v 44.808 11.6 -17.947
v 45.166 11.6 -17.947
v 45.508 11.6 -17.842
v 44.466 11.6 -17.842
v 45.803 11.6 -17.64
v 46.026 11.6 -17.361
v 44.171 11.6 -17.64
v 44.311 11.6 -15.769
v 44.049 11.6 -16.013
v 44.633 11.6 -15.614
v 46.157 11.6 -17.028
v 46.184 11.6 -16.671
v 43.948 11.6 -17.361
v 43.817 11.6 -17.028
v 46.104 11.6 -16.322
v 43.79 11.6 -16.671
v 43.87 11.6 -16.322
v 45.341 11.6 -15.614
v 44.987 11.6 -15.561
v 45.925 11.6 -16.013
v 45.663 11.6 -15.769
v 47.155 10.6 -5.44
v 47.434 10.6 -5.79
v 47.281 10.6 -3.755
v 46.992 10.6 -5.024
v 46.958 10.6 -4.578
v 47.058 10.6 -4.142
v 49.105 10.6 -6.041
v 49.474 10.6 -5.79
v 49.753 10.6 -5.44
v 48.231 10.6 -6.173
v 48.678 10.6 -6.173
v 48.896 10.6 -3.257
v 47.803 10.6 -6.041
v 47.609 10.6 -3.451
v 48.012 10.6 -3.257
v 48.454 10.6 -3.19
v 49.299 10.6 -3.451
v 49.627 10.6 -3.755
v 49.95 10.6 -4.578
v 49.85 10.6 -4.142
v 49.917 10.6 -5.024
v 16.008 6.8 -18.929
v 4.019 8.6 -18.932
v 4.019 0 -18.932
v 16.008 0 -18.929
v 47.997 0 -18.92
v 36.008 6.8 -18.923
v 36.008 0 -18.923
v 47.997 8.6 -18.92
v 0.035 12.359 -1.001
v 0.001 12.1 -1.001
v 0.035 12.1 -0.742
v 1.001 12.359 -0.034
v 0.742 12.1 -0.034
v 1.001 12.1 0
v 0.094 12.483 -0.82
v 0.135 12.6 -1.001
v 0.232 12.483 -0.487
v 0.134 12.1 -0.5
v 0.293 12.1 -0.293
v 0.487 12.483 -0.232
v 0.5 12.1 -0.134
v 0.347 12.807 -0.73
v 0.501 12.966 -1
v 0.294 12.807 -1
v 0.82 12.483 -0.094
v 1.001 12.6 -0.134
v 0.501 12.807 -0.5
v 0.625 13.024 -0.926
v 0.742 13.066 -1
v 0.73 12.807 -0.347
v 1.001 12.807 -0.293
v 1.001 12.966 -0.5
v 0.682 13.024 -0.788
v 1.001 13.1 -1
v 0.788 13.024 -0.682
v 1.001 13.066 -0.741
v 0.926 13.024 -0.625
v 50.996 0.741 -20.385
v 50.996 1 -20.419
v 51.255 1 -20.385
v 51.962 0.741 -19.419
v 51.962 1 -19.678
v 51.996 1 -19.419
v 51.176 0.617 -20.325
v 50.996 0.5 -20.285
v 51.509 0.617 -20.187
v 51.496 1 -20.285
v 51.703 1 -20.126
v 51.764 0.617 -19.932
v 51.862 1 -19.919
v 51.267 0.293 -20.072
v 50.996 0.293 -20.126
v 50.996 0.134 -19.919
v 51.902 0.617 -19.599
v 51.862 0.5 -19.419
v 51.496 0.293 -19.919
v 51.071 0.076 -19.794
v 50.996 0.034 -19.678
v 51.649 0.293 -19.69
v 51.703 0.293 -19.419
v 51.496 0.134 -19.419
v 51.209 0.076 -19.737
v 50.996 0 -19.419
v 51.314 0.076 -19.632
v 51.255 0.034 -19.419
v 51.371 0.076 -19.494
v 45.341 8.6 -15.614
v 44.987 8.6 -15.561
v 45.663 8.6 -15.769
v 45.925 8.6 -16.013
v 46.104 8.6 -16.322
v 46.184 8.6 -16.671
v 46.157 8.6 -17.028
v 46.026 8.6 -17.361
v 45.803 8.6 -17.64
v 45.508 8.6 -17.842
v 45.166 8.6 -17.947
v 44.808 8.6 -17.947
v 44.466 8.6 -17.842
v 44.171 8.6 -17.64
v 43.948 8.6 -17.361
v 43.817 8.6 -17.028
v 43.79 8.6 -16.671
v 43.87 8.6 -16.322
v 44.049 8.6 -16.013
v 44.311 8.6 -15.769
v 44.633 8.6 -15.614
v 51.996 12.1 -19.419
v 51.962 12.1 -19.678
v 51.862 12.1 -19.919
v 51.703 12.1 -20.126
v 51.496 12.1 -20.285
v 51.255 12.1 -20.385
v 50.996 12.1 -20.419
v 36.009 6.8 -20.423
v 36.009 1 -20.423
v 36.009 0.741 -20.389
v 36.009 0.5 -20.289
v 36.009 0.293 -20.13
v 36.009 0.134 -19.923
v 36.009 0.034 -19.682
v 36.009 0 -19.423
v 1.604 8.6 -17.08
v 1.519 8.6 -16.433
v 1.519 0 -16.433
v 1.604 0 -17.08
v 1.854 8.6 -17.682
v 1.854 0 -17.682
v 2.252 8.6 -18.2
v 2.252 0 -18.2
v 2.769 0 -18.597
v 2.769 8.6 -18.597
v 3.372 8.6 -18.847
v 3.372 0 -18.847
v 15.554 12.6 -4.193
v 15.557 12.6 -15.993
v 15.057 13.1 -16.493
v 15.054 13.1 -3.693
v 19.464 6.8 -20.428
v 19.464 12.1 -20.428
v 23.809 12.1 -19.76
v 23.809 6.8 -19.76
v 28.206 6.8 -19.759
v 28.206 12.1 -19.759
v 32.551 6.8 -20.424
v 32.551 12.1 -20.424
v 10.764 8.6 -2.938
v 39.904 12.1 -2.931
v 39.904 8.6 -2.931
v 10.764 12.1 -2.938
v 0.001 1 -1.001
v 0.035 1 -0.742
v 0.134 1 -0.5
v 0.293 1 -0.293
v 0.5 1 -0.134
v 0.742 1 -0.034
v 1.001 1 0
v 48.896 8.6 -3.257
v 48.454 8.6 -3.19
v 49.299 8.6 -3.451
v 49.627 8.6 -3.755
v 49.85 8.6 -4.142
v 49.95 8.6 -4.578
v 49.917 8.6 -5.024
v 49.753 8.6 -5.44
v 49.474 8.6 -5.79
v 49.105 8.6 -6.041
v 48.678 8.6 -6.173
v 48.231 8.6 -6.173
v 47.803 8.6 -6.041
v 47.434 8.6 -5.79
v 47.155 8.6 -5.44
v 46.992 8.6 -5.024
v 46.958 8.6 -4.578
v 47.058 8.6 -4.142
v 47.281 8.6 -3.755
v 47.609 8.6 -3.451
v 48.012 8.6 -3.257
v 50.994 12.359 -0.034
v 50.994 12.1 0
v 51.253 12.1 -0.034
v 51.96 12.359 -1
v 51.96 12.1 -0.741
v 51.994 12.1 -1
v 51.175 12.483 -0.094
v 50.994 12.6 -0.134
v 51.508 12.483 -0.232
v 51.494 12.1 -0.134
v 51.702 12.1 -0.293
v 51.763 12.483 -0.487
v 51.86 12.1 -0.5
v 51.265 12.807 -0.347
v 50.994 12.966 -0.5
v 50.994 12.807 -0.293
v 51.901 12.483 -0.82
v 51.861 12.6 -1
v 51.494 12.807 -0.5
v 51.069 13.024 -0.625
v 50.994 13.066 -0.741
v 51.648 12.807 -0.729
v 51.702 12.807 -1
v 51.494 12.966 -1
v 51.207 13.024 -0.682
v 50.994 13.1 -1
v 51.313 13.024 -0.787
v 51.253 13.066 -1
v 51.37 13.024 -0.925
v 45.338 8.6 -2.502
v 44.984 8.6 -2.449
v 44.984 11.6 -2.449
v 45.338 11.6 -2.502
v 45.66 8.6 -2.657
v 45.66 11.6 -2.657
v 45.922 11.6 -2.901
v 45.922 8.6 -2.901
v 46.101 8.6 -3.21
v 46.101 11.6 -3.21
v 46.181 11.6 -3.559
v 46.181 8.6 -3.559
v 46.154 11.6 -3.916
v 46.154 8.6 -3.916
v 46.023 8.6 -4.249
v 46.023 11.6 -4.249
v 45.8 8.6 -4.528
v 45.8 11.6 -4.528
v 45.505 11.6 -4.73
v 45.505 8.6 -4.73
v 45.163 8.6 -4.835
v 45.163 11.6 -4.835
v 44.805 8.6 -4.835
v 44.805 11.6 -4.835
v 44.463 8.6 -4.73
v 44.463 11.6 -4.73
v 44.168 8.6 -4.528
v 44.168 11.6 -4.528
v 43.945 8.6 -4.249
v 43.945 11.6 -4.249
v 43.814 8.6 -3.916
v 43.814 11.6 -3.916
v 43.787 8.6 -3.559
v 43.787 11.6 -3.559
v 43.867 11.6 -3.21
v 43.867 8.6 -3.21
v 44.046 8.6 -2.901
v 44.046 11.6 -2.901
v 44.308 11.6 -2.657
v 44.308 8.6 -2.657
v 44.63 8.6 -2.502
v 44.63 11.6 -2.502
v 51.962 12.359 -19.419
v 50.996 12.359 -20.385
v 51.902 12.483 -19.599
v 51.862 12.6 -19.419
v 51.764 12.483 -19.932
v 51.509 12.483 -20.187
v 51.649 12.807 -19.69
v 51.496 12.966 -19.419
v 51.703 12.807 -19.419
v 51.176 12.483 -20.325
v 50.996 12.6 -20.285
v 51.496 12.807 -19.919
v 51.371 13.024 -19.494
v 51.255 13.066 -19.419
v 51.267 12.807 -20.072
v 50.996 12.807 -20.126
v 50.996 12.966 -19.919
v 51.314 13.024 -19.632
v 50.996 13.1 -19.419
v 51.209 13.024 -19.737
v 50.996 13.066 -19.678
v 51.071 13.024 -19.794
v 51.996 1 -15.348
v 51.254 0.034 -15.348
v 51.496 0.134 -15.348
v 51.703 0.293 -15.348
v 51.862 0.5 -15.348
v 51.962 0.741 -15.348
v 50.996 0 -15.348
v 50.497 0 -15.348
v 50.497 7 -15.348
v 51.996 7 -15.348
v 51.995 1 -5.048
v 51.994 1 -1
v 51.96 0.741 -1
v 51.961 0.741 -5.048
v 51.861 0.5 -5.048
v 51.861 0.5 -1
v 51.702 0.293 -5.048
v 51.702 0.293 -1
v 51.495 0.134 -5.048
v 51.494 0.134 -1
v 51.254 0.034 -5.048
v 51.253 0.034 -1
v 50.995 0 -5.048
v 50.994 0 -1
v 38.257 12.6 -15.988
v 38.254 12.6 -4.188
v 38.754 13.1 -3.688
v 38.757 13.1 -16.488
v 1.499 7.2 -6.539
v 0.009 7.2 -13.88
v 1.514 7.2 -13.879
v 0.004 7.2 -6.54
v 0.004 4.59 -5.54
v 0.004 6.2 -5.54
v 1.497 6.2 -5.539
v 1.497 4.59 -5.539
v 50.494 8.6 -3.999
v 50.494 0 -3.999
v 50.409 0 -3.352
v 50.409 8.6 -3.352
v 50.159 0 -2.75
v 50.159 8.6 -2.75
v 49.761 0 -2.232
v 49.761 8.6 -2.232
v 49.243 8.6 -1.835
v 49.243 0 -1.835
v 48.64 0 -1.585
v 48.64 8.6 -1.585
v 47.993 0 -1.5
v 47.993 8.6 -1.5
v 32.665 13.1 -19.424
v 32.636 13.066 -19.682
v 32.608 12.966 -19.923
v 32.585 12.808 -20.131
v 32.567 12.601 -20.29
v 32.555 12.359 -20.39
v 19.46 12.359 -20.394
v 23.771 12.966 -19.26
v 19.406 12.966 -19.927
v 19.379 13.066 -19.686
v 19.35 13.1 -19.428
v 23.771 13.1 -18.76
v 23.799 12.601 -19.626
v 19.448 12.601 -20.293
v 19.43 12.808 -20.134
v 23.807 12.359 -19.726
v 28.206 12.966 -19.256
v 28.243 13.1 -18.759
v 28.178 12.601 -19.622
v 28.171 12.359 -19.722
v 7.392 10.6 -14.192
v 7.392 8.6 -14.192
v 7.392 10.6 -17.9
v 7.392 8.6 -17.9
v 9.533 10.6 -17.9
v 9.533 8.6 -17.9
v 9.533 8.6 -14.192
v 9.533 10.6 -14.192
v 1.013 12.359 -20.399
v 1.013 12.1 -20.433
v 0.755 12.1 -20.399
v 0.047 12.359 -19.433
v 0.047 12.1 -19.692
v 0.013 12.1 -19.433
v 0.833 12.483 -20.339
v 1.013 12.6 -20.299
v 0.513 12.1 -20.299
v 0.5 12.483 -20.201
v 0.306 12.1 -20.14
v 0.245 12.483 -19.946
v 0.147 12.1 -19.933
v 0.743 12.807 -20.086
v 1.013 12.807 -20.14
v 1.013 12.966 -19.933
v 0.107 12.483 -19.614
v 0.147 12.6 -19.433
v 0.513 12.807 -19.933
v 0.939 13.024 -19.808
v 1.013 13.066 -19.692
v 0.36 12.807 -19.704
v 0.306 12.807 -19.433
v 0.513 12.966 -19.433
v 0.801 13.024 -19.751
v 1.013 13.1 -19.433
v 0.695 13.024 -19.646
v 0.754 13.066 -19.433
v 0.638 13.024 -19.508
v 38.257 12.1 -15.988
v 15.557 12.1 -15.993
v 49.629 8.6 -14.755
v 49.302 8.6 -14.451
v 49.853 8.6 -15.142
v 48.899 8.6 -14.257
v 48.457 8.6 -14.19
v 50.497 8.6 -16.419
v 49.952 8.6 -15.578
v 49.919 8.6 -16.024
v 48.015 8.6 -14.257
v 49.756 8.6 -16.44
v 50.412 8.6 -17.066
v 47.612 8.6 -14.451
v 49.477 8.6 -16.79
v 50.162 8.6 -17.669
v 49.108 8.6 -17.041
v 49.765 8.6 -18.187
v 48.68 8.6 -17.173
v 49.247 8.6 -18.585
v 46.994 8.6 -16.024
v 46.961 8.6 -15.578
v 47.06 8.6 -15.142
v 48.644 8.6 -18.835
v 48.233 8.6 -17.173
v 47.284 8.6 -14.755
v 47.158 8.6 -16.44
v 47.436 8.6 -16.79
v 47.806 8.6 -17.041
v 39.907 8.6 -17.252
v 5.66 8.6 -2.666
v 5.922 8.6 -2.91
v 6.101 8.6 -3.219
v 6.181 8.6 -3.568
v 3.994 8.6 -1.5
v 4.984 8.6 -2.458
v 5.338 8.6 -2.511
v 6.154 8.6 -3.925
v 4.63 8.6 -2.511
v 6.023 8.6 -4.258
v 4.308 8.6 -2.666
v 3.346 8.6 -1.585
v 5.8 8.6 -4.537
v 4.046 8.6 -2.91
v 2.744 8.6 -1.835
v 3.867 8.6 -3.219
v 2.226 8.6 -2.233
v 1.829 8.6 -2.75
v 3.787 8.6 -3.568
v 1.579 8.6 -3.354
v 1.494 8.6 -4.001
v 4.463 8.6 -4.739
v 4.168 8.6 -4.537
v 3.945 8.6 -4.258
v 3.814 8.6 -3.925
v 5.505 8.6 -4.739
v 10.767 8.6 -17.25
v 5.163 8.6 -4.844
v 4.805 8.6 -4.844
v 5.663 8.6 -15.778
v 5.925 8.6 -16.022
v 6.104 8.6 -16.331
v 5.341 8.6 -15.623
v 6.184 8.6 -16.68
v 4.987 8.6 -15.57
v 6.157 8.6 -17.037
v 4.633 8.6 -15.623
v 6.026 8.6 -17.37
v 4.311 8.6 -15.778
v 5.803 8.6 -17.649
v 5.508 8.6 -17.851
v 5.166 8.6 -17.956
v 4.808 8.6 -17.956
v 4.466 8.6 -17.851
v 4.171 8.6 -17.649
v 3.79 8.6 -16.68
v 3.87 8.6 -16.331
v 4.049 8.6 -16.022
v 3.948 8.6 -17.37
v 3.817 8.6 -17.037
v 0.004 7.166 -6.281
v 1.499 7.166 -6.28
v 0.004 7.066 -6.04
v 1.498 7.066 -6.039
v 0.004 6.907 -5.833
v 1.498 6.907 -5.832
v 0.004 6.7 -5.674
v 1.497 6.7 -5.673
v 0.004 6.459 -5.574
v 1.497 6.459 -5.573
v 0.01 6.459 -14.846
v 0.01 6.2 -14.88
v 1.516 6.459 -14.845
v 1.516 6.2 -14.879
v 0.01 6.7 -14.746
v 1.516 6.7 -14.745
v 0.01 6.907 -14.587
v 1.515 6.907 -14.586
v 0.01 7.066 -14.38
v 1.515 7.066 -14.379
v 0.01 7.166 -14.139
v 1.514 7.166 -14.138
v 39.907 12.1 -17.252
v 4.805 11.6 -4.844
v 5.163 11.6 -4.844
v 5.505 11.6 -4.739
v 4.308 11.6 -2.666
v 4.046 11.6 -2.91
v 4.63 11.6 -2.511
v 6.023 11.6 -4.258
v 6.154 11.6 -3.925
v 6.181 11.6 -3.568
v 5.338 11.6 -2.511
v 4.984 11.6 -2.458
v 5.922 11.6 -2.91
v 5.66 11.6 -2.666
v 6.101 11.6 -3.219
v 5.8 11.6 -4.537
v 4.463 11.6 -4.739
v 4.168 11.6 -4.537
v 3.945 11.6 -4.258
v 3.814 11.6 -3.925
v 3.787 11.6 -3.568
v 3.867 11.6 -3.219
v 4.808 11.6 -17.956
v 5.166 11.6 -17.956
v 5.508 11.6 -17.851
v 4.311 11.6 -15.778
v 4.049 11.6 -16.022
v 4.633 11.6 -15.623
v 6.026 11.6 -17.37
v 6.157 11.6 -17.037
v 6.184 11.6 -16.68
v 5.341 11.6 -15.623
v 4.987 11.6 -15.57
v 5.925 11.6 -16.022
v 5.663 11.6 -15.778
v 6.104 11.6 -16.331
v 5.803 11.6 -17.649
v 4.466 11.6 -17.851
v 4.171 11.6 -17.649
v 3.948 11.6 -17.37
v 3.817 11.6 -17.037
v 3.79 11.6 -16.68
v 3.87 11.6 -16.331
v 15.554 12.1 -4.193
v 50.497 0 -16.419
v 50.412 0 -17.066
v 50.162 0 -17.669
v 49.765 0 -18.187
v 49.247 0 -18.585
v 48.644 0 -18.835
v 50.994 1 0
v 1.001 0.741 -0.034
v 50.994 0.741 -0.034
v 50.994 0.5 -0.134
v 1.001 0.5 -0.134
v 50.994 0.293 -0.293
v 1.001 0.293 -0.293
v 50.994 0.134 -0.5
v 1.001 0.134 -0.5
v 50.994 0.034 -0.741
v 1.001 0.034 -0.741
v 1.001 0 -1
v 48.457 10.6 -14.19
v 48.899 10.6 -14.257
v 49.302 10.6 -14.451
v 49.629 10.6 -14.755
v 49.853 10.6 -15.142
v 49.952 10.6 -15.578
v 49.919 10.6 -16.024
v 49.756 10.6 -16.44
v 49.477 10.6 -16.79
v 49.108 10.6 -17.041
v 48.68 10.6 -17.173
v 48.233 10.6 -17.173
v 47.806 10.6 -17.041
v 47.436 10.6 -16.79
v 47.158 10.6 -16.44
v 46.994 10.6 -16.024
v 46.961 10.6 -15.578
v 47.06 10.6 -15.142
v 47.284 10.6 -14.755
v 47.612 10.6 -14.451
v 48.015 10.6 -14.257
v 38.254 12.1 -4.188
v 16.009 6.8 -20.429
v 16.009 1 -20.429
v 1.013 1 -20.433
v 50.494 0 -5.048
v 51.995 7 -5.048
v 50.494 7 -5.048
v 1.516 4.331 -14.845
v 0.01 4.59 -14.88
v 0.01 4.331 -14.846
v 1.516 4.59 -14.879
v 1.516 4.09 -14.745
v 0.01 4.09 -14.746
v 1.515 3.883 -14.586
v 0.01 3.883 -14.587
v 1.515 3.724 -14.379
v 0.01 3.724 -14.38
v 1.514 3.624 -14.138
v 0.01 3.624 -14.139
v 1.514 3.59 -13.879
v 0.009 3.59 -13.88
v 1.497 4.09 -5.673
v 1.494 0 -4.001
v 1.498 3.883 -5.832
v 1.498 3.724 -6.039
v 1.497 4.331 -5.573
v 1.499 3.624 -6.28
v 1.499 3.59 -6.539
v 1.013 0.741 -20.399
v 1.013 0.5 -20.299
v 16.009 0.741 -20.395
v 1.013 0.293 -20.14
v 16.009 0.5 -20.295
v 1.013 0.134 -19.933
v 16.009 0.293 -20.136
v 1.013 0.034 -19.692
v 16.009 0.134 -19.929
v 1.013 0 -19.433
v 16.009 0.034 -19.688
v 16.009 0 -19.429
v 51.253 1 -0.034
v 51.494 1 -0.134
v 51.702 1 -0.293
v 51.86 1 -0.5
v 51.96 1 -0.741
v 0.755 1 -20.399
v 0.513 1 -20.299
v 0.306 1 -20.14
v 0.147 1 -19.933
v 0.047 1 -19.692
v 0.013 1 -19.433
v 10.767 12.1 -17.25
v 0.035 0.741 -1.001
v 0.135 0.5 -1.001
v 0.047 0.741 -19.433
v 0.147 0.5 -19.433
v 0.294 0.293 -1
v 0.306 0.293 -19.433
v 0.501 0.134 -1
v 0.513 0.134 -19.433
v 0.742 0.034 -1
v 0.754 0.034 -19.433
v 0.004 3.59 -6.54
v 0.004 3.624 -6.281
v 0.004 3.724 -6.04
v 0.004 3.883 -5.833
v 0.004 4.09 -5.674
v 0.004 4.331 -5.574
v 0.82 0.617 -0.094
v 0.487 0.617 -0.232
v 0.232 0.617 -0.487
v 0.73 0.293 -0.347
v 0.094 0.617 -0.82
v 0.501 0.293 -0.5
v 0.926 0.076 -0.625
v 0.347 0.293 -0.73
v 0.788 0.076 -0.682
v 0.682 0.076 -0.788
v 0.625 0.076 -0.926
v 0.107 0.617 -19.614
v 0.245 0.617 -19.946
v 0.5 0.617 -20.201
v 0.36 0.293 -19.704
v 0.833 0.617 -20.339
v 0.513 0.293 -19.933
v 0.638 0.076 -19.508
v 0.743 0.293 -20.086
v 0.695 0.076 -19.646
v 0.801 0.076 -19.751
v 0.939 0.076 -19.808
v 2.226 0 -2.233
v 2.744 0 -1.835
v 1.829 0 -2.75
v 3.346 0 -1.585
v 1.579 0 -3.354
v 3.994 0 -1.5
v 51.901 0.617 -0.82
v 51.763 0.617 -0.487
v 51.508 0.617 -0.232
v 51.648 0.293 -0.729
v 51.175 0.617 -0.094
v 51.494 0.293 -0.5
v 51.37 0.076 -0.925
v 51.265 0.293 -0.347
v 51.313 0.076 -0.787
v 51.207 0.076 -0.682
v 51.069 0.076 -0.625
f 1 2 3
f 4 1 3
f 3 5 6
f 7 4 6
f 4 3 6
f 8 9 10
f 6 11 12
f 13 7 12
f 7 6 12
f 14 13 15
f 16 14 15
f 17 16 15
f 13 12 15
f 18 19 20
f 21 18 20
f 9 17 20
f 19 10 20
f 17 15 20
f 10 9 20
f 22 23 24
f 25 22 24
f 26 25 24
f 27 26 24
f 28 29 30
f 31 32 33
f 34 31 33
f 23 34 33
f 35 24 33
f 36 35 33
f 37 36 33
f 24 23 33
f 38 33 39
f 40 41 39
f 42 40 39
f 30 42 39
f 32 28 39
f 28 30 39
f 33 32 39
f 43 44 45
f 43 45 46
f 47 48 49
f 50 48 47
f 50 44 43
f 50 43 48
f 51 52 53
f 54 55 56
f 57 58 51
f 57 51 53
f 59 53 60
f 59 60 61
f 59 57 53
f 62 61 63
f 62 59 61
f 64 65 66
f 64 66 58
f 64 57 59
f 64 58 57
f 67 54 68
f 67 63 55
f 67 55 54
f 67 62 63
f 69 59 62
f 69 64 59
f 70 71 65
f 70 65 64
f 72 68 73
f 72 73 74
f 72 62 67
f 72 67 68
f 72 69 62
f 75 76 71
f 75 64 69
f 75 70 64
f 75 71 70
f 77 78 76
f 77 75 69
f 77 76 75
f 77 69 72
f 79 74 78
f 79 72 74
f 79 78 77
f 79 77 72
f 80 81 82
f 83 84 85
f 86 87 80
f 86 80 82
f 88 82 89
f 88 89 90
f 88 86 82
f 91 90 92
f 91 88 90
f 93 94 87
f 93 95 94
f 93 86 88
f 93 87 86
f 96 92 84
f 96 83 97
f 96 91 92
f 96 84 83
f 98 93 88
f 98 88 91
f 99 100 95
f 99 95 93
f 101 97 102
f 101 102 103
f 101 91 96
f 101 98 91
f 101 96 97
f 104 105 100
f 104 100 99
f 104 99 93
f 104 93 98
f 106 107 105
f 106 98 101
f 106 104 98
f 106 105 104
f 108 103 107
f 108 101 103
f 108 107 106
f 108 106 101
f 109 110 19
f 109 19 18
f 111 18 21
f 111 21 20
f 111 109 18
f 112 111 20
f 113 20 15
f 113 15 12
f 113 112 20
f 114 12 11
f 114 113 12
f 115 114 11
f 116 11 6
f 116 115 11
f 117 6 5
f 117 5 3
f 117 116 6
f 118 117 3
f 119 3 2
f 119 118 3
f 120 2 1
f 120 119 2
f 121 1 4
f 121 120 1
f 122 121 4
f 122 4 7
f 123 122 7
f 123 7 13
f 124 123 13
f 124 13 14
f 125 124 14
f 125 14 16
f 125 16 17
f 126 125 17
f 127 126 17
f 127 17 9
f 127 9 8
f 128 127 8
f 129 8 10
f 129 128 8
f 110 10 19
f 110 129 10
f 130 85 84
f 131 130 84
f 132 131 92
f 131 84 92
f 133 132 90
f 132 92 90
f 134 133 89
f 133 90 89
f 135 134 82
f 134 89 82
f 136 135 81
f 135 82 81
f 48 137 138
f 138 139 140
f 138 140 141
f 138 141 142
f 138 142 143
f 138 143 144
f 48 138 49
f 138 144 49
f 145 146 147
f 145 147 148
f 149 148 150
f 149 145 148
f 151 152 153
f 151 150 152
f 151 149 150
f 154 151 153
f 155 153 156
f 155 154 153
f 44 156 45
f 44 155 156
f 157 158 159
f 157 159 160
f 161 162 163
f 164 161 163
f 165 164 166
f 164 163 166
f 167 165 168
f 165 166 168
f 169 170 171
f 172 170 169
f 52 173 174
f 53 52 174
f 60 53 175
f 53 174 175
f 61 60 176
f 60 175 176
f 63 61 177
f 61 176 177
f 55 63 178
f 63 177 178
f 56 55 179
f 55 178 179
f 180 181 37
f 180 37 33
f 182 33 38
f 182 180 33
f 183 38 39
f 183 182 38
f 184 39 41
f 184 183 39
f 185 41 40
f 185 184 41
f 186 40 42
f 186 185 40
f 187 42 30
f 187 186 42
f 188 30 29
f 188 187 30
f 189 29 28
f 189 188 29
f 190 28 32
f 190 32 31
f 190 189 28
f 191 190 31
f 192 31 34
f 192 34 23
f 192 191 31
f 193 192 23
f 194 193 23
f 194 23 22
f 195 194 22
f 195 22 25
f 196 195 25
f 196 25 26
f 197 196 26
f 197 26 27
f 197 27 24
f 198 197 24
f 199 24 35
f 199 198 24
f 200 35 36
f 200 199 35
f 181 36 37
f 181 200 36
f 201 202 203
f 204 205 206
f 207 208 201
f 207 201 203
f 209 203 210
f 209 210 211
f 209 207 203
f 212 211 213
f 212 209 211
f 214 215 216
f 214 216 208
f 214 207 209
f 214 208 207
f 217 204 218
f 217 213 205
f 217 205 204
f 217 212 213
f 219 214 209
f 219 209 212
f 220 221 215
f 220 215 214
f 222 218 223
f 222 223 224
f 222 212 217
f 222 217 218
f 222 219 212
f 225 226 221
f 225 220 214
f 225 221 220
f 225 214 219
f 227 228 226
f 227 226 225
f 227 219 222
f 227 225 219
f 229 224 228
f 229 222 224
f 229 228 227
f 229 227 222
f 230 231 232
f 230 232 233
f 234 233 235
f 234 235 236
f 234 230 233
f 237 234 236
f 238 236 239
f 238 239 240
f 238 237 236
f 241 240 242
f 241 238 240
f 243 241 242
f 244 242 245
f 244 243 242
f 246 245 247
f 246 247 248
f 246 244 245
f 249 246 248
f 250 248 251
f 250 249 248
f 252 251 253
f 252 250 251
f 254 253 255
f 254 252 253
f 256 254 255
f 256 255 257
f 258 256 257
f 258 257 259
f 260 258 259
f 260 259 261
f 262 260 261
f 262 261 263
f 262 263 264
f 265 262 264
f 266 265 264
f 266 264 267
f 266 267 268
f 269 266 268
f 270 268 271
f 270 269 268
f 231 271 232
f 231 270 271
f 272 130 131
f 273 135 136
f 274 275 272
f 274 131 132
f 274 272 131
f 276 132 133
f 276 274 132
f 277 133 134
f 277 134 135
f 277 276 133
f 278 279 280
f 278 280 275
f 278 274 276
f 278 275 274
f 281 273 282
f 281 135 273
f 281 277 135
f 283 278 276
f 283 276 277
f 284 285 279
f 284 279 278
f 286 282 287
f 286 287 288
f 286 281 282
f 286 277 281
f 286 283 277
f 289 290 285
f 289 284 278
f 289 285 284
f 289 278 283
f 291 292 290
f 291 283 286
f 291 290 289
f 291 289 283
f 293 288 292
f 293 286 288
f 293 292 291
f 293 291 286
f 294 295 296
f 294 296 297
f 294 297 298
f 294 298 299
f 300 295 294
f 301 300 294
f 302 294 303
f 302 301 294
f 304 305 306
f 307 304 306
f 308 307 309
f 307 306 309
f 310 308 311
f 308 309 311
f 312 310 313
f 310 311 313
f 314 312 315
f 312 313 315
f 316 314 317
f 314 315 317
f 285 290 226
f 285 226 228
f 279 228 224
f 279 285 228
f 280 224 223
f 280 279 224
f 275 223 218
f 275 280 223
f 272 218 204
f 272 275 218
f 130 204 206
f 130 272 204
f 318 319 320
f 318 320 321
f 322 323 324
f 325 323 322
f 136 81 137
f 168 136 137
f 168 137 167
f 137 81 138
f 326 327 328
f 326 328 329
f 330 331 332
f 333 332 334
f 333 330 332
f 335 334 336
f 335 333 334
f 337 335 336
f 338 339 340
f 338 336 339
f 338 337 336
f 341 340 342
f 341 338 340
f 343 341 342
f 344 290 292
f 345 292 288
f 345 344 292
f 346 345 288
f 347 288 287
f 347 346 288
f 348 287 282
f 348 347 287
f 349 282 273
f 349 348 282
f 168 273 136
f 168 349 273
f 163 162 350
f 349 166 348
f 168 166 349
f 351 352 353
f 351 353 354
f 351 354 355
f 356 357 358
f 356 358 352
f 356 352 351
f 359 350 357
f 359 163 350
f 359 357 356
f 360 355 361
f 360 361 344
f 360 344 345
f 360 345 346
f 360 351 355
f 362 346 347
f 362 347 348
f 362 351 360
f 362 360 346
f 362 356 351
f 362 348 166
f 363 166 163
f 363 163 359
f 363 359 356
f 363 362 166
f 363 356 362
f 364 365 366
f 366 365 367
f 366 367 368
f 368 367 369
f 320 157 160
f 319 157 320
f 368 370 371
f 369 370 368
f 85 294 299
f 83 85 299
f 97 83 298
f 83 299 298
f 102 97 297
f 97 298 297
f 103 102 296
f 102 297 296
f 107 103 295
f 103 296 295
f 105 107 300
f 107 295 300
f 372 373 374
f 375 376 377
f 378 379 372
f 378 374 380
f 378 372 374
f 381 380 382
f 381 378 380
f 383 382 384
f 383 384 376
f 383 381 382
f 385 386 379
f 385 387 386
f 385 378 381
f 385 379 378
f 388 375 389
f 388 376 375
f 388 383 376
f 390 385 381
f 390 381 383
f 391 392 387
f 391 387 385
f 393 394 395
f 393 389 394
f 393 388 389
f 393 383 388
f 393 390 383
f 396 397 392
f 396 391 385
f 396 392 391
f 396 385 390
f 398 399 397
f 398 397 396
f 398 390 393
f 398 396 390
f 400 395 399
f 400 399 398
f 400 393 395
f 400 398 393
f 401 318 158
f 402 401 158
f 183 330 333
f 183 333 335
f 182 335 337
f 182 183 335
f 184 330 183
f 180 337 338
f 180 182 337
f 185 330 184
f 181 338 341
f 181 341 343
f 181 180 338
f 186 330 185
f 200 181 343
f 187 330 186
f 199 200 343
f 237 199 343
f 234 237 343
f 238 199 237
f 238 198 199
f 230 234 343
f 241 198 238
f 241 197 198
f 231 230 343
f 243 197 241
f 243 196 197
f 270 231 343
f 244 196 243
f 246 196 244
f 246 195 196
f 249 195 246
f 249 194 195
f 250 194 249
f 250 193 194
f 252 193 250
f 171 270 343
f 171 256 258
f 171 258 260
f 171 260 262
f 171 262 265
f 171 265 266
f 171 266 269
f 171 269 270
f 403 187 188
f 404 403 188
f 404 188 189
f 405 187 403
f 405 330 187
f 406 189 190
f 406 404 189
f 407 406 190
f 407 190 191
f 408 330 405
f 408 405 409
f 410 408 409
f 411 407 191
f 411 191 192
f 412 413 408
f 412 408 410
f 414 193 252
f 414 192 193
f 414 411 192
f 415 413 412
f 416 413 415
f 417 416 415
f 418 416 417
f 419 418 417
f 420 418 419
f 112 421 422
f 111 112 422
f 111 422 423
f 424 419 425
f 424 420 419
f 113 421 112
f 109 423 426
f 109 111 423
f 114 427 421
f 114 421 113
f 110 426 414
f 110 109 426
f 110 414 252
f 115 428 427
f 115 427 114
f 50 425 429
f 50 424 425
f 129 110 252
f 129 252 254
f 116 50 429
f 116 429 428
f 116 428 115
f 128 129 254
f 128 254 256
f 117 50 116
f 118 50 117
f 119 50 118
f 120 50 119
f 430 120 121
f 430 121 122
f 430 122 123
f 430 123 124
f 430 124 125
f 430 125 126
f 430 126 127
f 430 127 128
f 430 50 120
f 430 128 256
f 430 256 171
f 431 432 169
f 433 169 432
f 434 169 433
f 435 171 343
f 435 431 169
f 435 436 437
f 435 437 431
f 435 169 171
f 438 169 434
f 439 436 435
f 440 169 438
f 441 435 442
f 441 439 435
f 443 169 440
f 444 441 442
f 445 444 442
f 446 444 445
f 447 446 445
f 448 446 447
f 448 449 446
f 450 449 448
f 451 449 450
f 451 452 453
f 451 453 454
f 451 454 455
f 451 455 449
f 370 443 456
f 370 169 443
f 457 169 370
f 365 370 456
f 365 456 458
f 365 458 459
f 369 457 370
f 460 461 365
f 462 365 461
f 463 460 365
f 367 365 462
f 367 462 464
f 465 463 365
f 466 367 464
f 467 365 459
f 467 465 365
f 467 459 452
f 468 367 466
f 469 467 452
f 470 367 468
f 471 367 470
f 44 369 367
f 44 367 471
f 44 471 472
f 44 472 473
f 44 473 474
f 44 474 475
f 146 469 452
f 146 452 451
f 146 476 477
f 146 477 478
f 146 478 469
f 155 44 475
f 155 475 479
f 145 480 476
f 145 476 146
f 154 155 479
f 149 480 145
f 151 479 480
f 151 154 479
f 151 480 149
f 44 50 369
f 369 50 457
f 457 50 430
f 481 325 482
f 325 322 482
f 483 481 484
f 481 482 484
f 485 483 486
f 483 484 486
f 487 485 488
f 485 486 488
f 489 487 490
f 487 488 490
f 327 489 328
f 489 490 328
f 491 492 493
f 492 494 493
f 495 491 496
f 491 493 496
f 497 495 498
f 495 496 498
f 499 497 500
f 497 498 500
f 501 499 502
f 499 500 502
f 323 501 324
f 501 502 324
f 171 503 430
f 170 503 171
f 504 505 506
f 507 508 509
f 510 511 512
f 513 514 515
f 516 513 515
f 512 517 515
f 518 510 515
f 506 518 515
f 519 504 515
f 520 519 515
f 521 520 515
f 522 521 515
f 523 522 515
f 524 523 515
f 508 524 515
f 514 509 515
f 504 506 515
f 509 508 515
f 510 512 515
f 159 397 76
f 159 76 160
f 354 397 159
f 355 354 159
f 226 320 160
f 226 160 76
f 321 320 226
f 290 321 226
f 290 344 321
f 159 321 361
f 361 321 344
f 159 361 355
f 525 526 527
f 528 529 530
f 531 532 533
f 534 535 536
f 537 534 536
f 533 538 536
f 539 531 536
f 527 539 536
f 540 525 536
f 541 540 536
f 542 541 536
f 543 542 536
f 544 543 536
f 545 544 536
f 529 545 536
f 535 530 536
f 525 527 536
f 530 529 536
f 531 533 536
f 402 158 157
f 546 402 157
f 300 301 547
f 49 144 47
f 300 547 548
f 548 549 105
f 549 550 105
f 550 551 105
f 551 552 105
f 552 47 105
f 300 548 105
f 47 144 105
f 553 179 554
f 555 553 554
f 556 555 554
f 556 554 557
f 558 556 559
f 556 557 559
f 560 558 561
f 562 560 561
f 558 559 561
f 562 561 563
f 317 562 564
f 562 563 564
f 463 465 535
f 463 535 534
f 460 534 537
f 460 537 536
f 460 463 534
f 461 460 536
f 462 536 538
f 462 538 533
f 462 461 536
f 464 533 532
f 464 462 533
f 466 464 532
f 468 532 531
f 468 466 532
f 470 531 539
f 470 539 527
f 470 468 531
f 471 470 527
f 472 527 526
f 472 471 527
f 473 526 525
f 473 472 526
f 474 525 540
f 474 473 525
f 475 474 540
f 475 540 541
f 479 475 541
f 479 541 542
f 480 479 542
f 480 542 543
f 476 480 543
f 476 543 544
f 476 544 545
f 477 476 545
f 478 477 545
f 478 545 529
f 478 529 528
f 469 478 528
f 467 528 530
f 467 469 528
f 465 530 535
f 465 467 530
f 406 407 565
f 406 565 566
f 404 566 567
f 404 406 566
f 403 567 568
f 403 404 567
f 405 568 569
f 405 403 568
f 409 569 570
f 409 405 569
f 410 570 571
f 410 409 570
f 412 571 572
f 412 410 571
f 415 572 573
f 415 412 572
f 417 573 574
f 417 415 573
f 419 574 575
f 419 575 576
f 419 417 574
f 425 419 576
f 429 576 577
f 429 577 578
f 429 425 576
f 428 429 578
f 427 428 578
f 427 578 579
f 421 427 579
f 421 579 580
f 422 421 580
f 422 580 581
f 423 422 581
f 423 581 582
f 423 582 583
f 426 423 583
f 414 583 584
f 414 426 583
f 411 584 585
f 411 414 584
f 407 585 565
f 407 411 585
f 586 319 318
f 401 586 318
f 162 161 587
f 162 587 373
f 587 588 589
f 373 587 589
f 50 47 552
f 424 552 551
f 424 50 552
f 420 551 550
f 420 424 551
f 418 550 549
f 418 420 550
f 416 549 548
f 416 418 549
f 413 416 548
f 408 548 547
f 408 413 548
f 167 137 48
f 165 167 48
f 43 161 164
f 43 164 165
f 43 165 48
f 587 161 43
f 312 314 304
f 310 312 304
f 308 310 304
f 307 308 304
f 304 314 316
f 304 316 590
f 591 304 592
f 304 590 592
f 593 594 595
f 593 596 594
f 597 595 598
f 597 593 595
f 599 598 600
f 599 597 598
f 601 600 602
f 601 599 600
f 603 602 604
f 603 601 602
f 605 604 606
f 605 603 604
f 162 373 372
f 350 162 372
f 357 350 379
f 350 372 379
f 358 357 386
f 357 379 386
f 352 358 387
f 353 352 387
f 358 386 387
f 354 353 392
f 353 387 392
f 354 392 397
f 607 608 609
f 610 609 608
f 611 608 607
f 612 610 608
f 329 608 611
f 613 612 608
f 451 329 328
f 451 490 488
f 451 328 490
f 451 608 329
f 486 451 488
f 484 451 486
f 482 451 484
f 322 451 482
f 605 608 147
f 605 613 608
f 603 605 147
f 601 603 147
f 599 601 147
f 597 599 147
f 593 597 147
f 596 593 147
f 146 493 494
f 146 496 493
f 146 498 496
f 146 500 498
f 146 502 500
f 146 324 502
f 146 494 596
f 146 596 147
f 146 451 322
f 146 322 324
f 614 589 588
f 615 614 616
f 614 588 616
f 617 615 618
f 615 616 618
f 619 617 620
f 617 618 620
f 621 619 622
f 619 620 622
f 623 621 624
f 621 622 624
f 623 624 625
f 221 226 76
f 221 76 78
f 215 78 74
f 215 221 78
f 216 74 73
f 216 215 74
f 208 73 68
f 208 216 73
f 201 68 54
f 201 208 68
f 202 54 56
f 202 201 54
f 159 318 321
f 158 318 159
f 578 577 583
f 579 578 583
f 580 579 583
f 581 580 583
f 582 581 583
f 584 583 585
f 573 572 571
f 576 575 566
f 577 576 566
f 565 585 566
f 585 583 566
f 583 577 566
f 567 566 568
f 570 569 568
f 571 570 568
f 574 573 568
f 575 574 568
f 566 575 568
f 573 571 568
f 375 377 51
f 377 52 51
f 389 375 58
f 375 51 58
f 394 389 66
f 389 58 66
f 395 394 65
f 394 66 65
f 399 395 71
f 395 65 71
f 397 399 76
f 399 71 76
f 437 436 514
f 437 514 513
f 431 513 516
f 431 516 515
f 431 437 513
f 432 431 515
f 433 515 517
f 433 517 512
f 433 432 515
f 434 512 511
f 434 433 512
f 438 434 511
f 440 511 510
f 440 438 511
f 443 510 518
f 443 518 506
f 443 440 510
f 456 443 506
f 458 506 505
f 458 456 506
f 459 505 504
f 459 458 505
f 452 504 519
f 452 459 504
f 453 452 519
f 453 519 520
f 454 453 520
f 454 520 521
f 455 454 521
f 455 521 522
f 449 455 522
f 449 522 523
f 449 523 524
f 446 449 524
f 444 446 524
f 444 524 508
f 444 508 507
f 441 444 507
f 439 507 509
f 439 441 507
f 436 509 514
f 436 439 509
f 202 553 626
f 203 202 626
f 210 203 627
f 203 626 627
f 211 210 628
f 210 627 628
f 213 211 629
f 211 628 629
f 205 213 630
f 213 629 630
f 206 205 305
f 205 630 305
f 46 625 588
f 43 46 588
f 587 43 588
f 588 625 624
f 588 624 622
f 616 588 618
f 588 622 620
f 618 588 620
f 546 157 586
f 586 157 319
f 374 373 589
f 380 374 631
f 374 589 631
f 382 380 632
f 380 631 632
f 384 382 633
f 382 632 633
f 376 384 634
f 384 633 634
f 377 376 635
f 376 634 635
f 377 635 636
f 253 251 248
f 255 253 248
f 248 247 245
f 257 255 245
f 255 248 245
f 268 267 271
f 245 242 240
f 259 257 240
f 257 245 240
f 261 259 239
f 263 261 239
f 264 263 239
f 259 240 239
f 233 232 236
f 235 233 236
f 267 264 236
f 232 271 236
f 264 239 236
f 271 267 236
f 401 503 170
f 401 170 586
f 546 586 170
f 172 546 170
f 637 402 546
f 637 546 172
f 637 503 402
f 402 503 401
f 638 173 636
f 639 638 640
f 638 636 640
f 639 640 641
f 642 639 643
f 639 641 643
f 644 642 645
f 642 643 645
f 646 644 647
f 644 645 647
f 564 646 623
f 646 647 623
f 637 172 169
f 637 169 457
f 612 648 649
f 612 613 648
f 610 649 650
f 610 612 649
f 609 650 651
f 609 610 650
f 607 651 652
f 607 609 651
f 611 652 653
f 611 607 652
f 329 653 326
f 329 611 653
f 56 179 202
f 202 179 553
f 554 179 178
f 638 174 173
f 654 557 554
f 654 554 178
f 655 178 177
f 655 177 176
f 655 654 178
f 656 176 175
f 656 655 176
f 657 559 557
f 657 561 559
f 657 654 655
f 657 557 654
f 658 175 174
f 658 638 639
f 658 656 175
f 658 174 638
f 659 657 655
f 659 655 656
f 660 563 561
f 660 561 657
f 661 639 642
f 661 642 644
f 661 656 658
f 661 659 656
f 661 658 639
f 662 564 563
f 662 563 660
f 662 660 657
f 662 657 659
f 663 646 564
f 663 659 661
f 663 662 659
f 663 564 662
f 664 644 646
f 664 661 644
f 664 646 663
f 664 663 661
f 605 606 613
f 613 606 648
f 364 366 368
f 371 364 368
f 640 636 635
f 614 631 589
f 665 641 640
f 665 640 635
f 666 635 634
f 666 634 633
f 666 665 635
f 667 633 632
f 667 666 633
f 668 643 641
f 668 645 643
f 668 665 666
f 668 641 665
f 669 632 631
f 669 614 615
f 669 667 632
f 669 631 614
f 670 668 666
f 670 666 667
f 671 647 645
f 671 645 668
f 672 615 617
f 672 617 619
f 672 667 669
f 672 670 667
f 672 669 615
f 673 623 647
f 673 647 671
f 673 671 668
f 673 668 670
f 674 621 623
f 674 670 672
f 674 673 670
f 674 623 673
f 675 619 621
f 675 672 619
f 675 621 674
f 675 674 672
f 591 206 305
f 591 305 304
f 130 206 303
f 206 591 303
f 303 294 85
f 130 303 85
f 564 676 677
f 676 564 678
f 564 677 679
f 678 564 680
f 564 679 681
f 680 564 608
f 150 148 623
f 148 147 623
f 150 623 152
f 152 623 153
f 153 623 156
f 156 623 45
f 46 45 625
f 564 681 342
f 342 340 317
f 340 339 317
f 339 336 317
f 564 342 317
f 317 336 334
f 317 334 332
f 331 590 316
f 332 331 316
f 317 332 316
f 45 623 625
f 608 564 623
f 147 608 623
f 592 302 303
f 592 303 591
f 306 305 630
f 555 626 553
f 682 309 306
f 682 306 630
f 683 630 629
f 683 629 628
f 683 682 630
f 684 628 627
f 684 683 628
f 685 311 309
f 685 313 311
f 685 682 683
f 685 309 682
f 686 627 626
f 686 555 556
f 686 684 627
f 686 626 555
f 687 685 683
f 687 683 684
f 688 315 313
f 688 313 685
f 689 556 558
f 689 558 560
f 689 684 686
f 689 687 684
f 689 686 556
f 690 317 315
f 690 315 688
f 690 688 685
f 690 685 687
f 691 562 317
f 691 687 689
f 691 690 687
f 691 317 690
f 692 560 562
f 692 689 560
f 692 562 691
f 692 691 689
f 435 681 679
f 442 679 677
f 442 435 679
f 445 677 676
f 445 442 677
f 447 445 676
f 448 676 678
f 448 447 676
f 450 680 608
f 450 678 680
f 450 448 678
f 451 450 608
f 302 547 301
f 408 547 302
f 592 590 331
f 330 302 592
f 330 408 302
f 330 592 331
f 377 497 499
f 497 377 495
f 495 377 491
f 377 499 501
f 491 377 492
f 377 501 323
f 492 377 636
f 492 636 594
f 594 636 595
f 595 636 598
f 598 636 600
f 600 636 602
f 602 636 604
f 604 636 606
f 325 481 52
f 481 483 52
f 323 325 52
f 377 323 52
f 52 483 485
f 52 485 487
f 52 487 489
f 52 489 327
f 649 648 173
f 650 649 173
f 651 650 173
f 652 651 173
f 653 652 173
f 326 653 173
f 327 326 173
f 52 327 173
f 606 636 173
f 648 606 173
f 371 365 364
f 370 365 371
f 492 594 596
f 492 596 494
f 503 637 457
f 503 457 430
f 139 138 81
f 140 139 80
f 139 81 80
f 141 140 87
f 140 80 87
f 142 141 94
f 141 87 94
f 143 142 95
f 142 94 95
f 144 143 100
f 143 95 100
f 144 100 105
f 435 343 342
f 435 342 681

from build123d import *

# Parameters (mm, degrees)
EXTRUDE_1_DEPTH      = 13.1
CUT_EXTRUDE_1_DEPTH  = 1
CUT_EXTRUDE_2_DEPTH  = 3.5
CUT_EXTRUDE_3_DEPTH  = 11.5
SKETCH_7_R           = 1.2
CUT_EXTRUDE_4_DEPTH  = 3
CUT_EXTRUDE_5_DEPTH  = 3
SKETCH_17_W          = 10.3
SKETCH_17_H          = 7
CUT_EXTRUDE_7_DEPTH  = 3
SKETCH_23_R          = 28.905330341
CUT_EXTRUDE_16_DEPTH = 15
FILLET_1_R           = 1
FILLET_2_R           = 1
CHAMFER_1_SIZE       = 0.5
FILLET_3_R           = 1
SKETCH_24_W          = 2.140700812
SKETCH_24_H          = 3.70780257
CUT_EXTRUDE_17_DEPTH = 2
FILLET_4_R           = 1
CUT_EXTRUDE_18_DEPTH = 7
SKETCH_27_R          = 1.5
CUT_EXTRUDE_19_DEPTH = 2
CUT_EXTRUDE_20_DEPTH = 6.8


with BuildPart() as part:
    # 草图2 → 凸台-拉伸1 (new body)
    with BuildSketch(Plane(origin=(0, 0, 0), x_dir=(1, 0, 0), z_dir=(0, 1, 0))):
        Polygon((0.013768766, 20.433061971), (0, 0), (51.994397286, 0), (51.996083203, 20.418836971), align=None)
    extrude(amount=EXTRUDE_1_DEPTH)

    # 草图3 → 切除-拉伸1 (cut)
    with BuildSketch(Plane(origin=(0, 13.1, 0), x_dir=(1, 0, 0), z_dir=(0, 1, 0))):
        Polygon((15.554216141, 4.193063032), (38.254215601, 4.188106843), (38.256906278, 15.988112082), (15.556906819, 15.993072091), align=None)
    extrude(amount=-CUT_EXTRUDE_1_DEPTH, mode=Mode.SUBTRACT)

    # 草图4 → 切除-拉伸2 (cut)
    with BuildSketch(Plane(origin=(0, 12.1, 0), x_dir=(1, 0, 0), z_dir=(0, 1, 0))):
        Polygon((11.266979682, 17.10036488), (39.706985915, 17.101636261), (39.703966397, 3.081173841), (11.263967233, 3.087658824), align=None)
    extrude(amount=-CUT_EXTRUDE_2_DEPTH, mode=Mode.SUBTRACT)

    # 草图6 → 切除-拉伸3 (cut)
    with BuildSketch(Plane(origin=(0, 8.6, 0), x_dir=(1, 0, 0), z_dir=(0, 1, 0))):
        with BuildLine():
            Line((4.019496655, 18.931965744), (47.997410654, 18.919931154))
            ThreePointArc((47.997410654, 18.919931154), (49.765007767, 18.187296206), (50.496836532, 16.419365162))
            Line((50.496836532, 16.419365162), (50.493979096, 3.999425891))
            ThreePointArc((50.493979096, 3.999425891), (49.761344148, 2.231828778), (47.993413104, 1.500000013))
            Line((47.993413104, 1.500000013), (3.99352536, 1.500000013))
            ThreePointArc((3.99352536, 1.500000013), (2.225928247, 2.232634961), (1.494099482, 4.000566005))
            Line((1.494099482, 4.000566005), (1.518930662, 16.432539866))
            ThreePointArc((1.518930662, 16.432539866), (2.25156561, 18.200136979), (4.019496655, 18.931965744))
        make_face()
    extrude(amount=-CUT_EXTRUDE_3_DEPTH, mode=Mode.SUBTRACT)

    # 草图7 → 切除-拉伸4 (cut)
    with BuildSketch(Plane(origin=(0, 8.6, 0), x_dir=(1, 0, 0), z_dir=(0, 1, 0))):
        with Locations(Location((4.986997661, 16.769823075, 0), (0, 0, 270))):
            Circle(SKETCH_7_R)
        with Locations(Location((4.984007822, 3.657835416, 0), (0, 0, 270))):
            Circle(SKETCH_7_R)
        with Locations(Location((44.986916621, 16.760702161, 0), (0, 0, 270))):
            Circle(SKETCH_7_R)
        with Locations(Location((44.983926782, 3.648714502, 0), (0, 0, 270))):
            Circle(SKETCH_7_R)
    extrude(amount=CUT_EXTRUDE_4_DEPTH, mode=Mode.SUBTRACT)

    # 草图15 → 切除-拉伸5 (cut)
    with BuildSketch(Plane(origin=(0, 0, 0), x_dir=(-0.0006738472400635568, 0, 0.9999997729649228), z_dir=(-0.9999997729649228, 0, -0.0006738472400635568))):
        Polygon((-5.54, 3.59), (-10.21, 3.59), (-14.88, 3.59), (-14.88, 7.2), (-5.54, 7.2), align=None)
    extrude(amount=-CUT_EXTRUDE_5_DEPTH, mode=Mode.SUBTRACT)

    # 草图17 → 切除-拉伸7 (cut)
    with BuildSketch(Plane(origin=(50.493056282, 0, 0.011616857), x_dir=(-0.00023006840747121236, 0, 0.9999999735342636), z_dir=(-0.9999999735342636, 0, -0.00023006840747121236))):
        with Locations((-10.21, 3.5)):
            Rectangle(SKETCH_17_W, SKETCH_17_H)
    extrude(amount=-CUT_EXTRUDE_7_DEPTH, mode=Mode.SUBTRACT)

    # 草图23 → 切除-拉伸16 (cut)
    with BuildSketch(Plane(origin=(0, 13.1, 0), x_dir=(1, 0, 0), z_dir=(0, 1, 0))):
        with Locations((26.015215658, 48.580825692)):
            Circle(SKETCH_23_R)
    extrude(amount=-CUT_EXTRUDE_16_DEPTH, mode=Mode.SUBTRACT)

    # 圆角1
    fillet_1_edges = [part.edges().sort_by_distance(p)[0] for p in [
        (25.997198643, 13.1, 0),
        (9.738753423, 13.1, -20.430400722),
        (26.007305692, 13.1, -19.675496433),
        (51.995240244, 13.1, -10.209418486),
        (42.273683616, 13.1, -20.421497513),
        (0.006884383, 13.1, -10.216530986),
    ]]
    fillet(fillet_1_edges, radius=FILLET_1_R)

    # 圆角2
    # the kernel refuses this fillet: 1 mm, written as the material it takes off along each edge
    with BuildSketch(Plane(origin=(50.996000655, 12.1, -19.419110607), x_dir=(0.9999999965913674, 0, 8.256673242544318e-05), z_dir=(0, 1, 0))) as fillet_2_piece_1_section:
        Polygon((0, 0), (FILLET_2_R, 0), (FILLET_2_R, FILLET_2_R * 0.999808934229), (FILLET_2_R * 0.00019108402398, FILLET_2_R * 0.999999981743), align=None)
    fillet_2_piece_1 = extrude(amount=FILLET_2_R, mode=Mode.PRIVATE)
    fillet_2_piece_1 = fillet_2_piece_1 - Plane(origin=(50.996000655, 12.1, -19.419110607), x_dir=(-0.707232711871647, 0, 0.706980828070094), z_dir=(0, 1, 0)) * Sphere(FILLET_2_R, mode=Mode.PRIVATE)
    add(fillet_2_piece_1, mode=Mode.SUBTRACT)
    with BuildSketch(Plane(origin=(50.994479849, 12.1, -1), x_dir=(0, 0, 1), z_dir=(0, 1, 0))) as fillet_2_piece_2_section:
        Polygon((0, 0), (FILLET_2_R, 0), (FILLET_2_R, FILLET_2_R * 0.999917436676), (FILLET_2_R * 8.25667324293e-05, FILLET_2_R * 0.999999996591), align=None)
    fillet_2_piece_2 = extrude(amount=FILLET_2_R, mode=Mode.PRIVATE)
    fillet_2_piece_2 = fillet_2_piece_2 - Plane(origin=(50.994479849, 12.1, -1), x_dir=(-0.707077588835758, 0, -0.7071359723322034), z_dir=(0, 1, 0)) * Sphere(FILLET_2_R, mode=Mode.PRIVATE)
    add(fillet_2_piece_2, mode=Mode.SUBTRACT)
    with BuildSketch(Plane(origin=(1.013094961, 12.1, -19.432788467), x_dir=(-0.9999997729649228, 0, -0.0006738472400635567), z_dir=(0, 1, 0))) as fillet_2_piece_3_section:
        Polygon((0, 0), (FILLET_2_R, 0), (FILLET_2_R, -FILLET_2_R * 0.999599883524), (FILLET_2_R * 0.000400196522714, -FILLET_2_R * 0.999999919921), align=None)
    fillet_2_piece_3 = extrude(amount=FILLET_2_R, mode=Mode.PRIVATE)
    fillet_2_piece_3 = fillet_2_piece_3 - Plane(origin=(1.013094961, 12.1, -19.432788467), x_dir=(0.706771710700509, 0, 0.7074416929708596), z_dir=(0, 1, 0)) * Sphere(FILLET_2_R, mode=Mode.PRIVATE)
    add(fillet_2_piece_3, mode=Mode.SUBTRACT)
    with BuildSketch(Plane(origin=(1.000674074, 12.1, -1), x_dir=(-0.9999997729649228, 0, -0.0006738472400635567), z_dir=(0, 1, 0))) as fillet_2_piece_4_section:
        Polygon((0, 0), (FILLET_2_R, 0), (FILLET_2_R, FILLET_2_R * 1.00067407443), (-FILLET_2_R * 0.000673847240067, FILLET_2_R * 0.999999772965), align=None)
    fillet_2_piece_4 = extrude(amount=FILLET_2_R, mode=Mode.PRIVATE)
    fillet_2_piece_4 = fillet_2_piece_4 - Plane(origin=(1.000674074, 12.1, -1), x_dir=(0.707344982042023, 0, -0.7068685000620484), z_dir=(0, 1, 0)) * Sphere(FILLET_2_R, mode=Mode.PRIVATE)
    add(fillet_2_piece_4, mode=Mode.SUBTRACT)
    with BuildSketch(Plane(origin=(0, -2.501685186, 0), x_dir=(0.0006738472400635051, 0, -0.9999997729649227), z_dir=(0, 1, 0))) as fillet_2_piece_5:
        with BuildLine():
            CenterArc((FILLET_2_R * 1.00067407443, -FILLET_2_R), FILLET_2_R, 90, 90.038608606)
            Line((FILLET_2_R * 0.000674301463259, -FILLET_2_R * 1.00067384724), (0, 0))
            Line((0, 0), (FILLET_2_R * 1.00067407443, 0))
        make_face()
    extrude(amount=14.601685186, mode=Mode.SUBTRACT)
    with BuildSketch(Plane(origin=(0.013768766, -2.498999709, -20.433061971), x_dir=(-0.0006738472400636408, 0, 0.9999997729649228), z_dir=(0, 1, 0))) as fillet_2_piece_6:
        with BuildLine():
            CenterArc((FILLET_2_R * 0.999599883524, FILLET_2_R), FILLET_2_R, 180.022929572, 89.977070428)
            Line((-FILLET_2_R * 0.000400036397496, FILLET_2_R * 0.999599803477), (0, 0))
            Line((0, 0), (FILLET_2_R * 0.999599883524, 0))
        make_face()
    extrude(amount=14.598999709, mode=Mode.SUBTRACT)
    with BuildSketch(Plane(origin=(51.994397286, -2.499793592, 0), x_dir=(-1, 0, 0), z_dir=(0, 1, 0))) as fillet_2_piece_7:
        with BuildLine():
            CenterArc((FILLET_2_R * 0.999917436676, -FILLET_2_R), FILLET_2_R, 90, 89.995269275)
            Line((-FILLET_2_R * 8.2559915445e-05, -FILLET_2_R * 0.999917433268), (0, 0))
            Line((0, 0), (FILLET_2_R * 0.999917436676, 0))
        make_face()
    extrude(amount=14.599793592, mode=Mode.SUBTRACT)
    with BuildSketch(Plane(origin=(51.996083203, -2.499522336, -20.418836971), x_dir=(-8.256673242407848e-05, 0, 0.9999999965913674), z_dir=(0, 1, 0))) as fillet_2_piece_8:
        with BuildLine():
            CenterArc((FILLET_2_R * 0.999808934229, -FILLET_2_R), FILLET_2_R, 90, 89.989051692)
            Line((-FILLET_2_R * 0.000191047514369, -FILLET_2_R * 0.999808915976), (0, 0))
            Line((0, 0), (FILLET_2_R * 0.999808934229, 0))
        make_face()
    extrude(amount=14.599522336, mode=Mode.SUBTRACT)

    # 倒角1
    chamfer_1_edges = [part.edges().sort_by_distance(p)[0] for p in [
        (15.55556148, 13.1, -10.093067561),
        (26.904215871, 13.1, -4.190584937),
        (38.25556094, 13.1, -10.088109463),
        (26.906906548, 13.1, -15.990592087),
    ]]
    chamfer(chamfer_1_edges, length=CHAMFER_1_SIZE)

    # 圆角3
    # the kernel refuses this fillet: 1 mm, written as the material it takes off along each edge
    with BuildSketch(Plane(origin=(51.995458107, 0, -12.848037855), x_dir=(0, 1, 0), z_dir=(8.256673242544318e-05, 0, -0.9999999965913674))) as fillet_3_piece_1:
        with BuildLine():
            CenterArc((FILLET_3_R, -FILLET_3_R), FILLET_3_R, 90, 90)
            Line((0, -FILLET_3_R), (0, 0))
            Line((0, 0), (FILLET_3_R, 0))
        make_face()
    extrude(amount=6.570990208, mode=Mode.SUBTRACT)
    with BuildSketch(Plane(origin=(21.963737986, 0, -20.427055345), x_dir=(0, 1, 0), z_dir=(-0.9999999625576317, 0, -0.0002736507542471488))) as fillet_3_piece_2:
        with BuildLine():
            CenterArc((FILLET_3_R, -FILLET_3_R), FILLET_3_R, 90, 90)
            Line((0, -FILLET_3_R), (0, 0))
            Line((0, 0), (FILLET_3_R, 0))
        make_face()
    extrude(amount=20.950370159, mode=Mode.SUBTRACT)
    with BuildSketch(Plane(origin=(26.015215658, 0, -48.580825692), x_dir=(-0.309941939695479, 0, 0.9507554859256947), z_dir=(-0.9507554859256947, 0, -0.309941939695479))) as fillet_3_piece_3:
        with BuildLine():
            CenterArc((28.905330341 + FILLET_3_R, FILLET_3_R), FILLET_3_R, 180, 90)
            Line((28.905330341 + FILLET_3_R, 0), (28.905330341, 0))
            Line((28.905330341, 0), (28.905330341, FILLET_3_R))
        make_face()
    revolve(axis=Axis((26.015215658, 0, -48.580825692), (0, 1, 0)), revolution_arc=36.08010502, mode=Mode.SUBTRACT)
    with BuildSketch(Plane(origin=(50.996274306, 0, -20.41911057), x_dir=(0, 1, 0), z_dir=(-0.9999999625576317, 0, -0.0002736507542471488))) as fillet_3_piece_4:
        with BuildLine():
            CenterArc((FILLET_3_R, -FILLET_3_R), FILLET_3_R, 90, 90)
            Line((0, -FILLET_3_R), (0, 0))
            Line((0, 0), (FILLET_3_R, 0))
        make_face()
    extrude(amount=20.944990968, mode=Mode.SUBTRACT)
    with BuildSketch(Plane(origin=(51.994479846, 0, -0.999917433), x_dir=(0, 1, 0), z_dir=(8.256673242544318e-05, 0, -0.9999999965913674))) as fillet_3_piece_5:
        with BuildLine():
            CenterArc((FILLET_3_R, -FILLET_3_R), FILLET_3_R, 90, 90)
            Line((0, -FILLET_3_R), (0, 0))
            Line((0, 0), (FILLET_3_R, 0))
        make_face()
    extrude(amount=6.54812035, mode=Mode.SUBTRACT)
    with BuildSketch(Plane(origin=(1.000674074, 0, 0), x_dir=(0, 1, 0), z_dir=(1, 0, 0))) as fillet_3_piece_6:
        with BuildLine():
            CenterArc((FILLET_3_R, -FILLET_3_R), FILLET_3_R, 90, 90)
            Line((0, -FILLET_3_R), (0, 0))
            Line((0, 0), (FILLET_3_R, 0))
        make_face()
    extrude(amount=49.993805775, mode=Mode.SUBTRACT)
    with BuildSketch(Plane(origin=(0.013095188, 0, -19.433462315), x_dir=(0, 1, 0), z_dir=(-0.0006738472400635567, 0, 0.9999997729649228))) as fillet_3_piece_7:
        with BuildLine():
            CenterArc((FILLET_3_R, -FILLET_3_R), FILLET_3_R, 90, 90)
            Line((0, -FILLET_3_R), (0, 0))
            Line((0, 0), (FILLET_3_R, 0))
        make_face()
    extrude(amount=18.432792652, mode=Mode.SUBTRACT)
    with BuildSketch(Plane(origin=(1.013094961, 0, -19.432788467), x_dir=(-0.9999997729649229, 0, -0.0006738472400016349), z_dir=(-0.0006738472400016349, 0, 0.9999997729649229))) as fillet_3_piece_8:
        with BuildLine():
            CenterArc((1 - FILLET_3_R, -FILLET_3_R), FILLET_3_R, 0, 90)
            Line((1, -FILLET_3_R), (1, 0))
            Line((1, 0), (1 - FILLET_3_R, 0))
        make_face()
    revolve(axis=Axis((1.013094961, 0, -19.432788467), (0, -1, 0)), revolution_arc=89.977070428, mode=Mode.SUBTRACT)
    with BuildSketch(Plane(origin=(1.000674074, 0, -1), x_dir=(0, 0, 1), z_dir=(1, 0, 0))) as fillet_3_piece_9:
        with BuildLine():
            CenterArc((1 - FILLET_3_R, -FILLET_3_R), FILLET_3_R, 0, 90)
            Line((1, -FILLET_3_R), (1, 0))
            Line((1, 0), (1 - FILLET_3_R, 0))
        make_face()
    revolve(axis=Axis((1.000674074, 0, -1), (0, -1, 0)), revolution_arc=90.038608606, mode=Mode.SUBTRACT)
    with BuildSketch(Plane(origin=(50.994479849, 0, -1), x_dir=(0.9999999965913675, 0, 8.256673243356417e-05), z_dir=(8.256673243356417e-05, 0, -0.9999999965913675))) as fillet_3_piece_10:
        with BuildLine():
            CenterArc((1 - FILLET_3_R, -FILLET_3_R), FILLET_3_R, 0, 90)
            Line((1 - FILLET_3_R, 0), (1, 0))
            Line((1, 0), (1, -FILLET_3_R))
        make_face()
    revolve(axis=Axis((50.994479849, 0, -1), (0, -1, 0)), revolution_arc=89.995269275, mode=Mode.SUBTRACT)
    with BuildSketch(Plane(origin=(50.996000655, 0, -19.419110607), x_dir=(0.0002736507538187996, 0, -0.9999999625576318), z_dir=(-0.9999999625576318, 0, -0.0002736507538187996))) as fillet_3_piece_11:
        with BuildLine():
            CenterArc((1 - FILLET_3_R, -FILLET_3_R), FILLET_3_R, 0, 90)
            Line((1, -FILLET_3_R), (1, 0))
            Line((1, 0), (1 - FILLET_3_R, 0))
        make_face()
    revolve(axis=Axis((50.996000655, 0, -19.419110607), (0, -1, 0)), revolution_arc=89.989051692, mode=Mode.SUBTRACT)

    # 草图24 → 切除-拉伸17 (cut)
    with BuildSketch(Plane(origin=(0, 8.6, 0), x_dir=(1, 0, 0), z_dir=(0, 1, 0))):
        with Locations((8.462622832, 16.045923285)):
            Rectangle(SKETCH_24_W, SKETCH_24_H)
    extrude(amount=CUT_EXTRUDE_17_DEPTH, mode=Mode.SUBTRACT)

    # 圆角4
    fillet_4_edges = [part.edges().sort_by_distance(p)[0] for p in [
        (0.750452697, 7.2, -5.539495567),
        (0.750452697, 3.59, -5.539495567),
        (0.762927244, 3.59, -14.879489282),
        (0.762927244, 7.2, -14.879489282),
    ]]
    fillet(fillet_4_edges, radius=FILLET_4_R)

    # 草图26 → 切除-拉伸18 (cut)
    with BuildSketch(Plane(origin=(0, 12.1, 0), x_dir=(1, 0, 0), z_dir=(0, 1, 0))):
        Polygon((10.766919033, 17.250342525), (39.906938681, 17.251645191), (39.904017699, 2.931239843), (10.76374648, 2.937682491), align=None)
    extrude(amount=-CUT_EXTRUDE_18_DEPTH, mode=Mode.SUBTRACT)

    # 草图27 → 切除-拉伸19 (cut)
    with BuildSketch(Plane(origin=(0, 8.6, 0), x_dir=(1, 0, 0), z_dir=(0, 1, 0))):
        with Locations(Location((48.456693563, 15.689986743, 0), (0, 0, 270))):
            Circle(SKETCH_27_R)
        with Locations(Location((48.454185312, 4.690009029, 0), (0, 0, 270))):
            Circle(SKETCH_27_R)
    extrude(amount=CUT_EXTRUDE_19_DEPTH, mode=Mode.SUBTRACT)

    # 草图28 → 切除-拉伸20 (cut)
    with BuildSketch(Plane(origin=(0, 0, 0), x_dir=(1, 0, 0), z_dir=(0, 1, 0))):
        Polygon((36.008795325, 20.423211905), (36.008407686, 18.723211947), (16.008408414, 18.728684962), (16.008796053, 20.42868492), align=None)
    extrude(amount=CUT_EXTRUDE_20_DEPTH, mode=Mode.SUBTRACT)


solid = part.part
